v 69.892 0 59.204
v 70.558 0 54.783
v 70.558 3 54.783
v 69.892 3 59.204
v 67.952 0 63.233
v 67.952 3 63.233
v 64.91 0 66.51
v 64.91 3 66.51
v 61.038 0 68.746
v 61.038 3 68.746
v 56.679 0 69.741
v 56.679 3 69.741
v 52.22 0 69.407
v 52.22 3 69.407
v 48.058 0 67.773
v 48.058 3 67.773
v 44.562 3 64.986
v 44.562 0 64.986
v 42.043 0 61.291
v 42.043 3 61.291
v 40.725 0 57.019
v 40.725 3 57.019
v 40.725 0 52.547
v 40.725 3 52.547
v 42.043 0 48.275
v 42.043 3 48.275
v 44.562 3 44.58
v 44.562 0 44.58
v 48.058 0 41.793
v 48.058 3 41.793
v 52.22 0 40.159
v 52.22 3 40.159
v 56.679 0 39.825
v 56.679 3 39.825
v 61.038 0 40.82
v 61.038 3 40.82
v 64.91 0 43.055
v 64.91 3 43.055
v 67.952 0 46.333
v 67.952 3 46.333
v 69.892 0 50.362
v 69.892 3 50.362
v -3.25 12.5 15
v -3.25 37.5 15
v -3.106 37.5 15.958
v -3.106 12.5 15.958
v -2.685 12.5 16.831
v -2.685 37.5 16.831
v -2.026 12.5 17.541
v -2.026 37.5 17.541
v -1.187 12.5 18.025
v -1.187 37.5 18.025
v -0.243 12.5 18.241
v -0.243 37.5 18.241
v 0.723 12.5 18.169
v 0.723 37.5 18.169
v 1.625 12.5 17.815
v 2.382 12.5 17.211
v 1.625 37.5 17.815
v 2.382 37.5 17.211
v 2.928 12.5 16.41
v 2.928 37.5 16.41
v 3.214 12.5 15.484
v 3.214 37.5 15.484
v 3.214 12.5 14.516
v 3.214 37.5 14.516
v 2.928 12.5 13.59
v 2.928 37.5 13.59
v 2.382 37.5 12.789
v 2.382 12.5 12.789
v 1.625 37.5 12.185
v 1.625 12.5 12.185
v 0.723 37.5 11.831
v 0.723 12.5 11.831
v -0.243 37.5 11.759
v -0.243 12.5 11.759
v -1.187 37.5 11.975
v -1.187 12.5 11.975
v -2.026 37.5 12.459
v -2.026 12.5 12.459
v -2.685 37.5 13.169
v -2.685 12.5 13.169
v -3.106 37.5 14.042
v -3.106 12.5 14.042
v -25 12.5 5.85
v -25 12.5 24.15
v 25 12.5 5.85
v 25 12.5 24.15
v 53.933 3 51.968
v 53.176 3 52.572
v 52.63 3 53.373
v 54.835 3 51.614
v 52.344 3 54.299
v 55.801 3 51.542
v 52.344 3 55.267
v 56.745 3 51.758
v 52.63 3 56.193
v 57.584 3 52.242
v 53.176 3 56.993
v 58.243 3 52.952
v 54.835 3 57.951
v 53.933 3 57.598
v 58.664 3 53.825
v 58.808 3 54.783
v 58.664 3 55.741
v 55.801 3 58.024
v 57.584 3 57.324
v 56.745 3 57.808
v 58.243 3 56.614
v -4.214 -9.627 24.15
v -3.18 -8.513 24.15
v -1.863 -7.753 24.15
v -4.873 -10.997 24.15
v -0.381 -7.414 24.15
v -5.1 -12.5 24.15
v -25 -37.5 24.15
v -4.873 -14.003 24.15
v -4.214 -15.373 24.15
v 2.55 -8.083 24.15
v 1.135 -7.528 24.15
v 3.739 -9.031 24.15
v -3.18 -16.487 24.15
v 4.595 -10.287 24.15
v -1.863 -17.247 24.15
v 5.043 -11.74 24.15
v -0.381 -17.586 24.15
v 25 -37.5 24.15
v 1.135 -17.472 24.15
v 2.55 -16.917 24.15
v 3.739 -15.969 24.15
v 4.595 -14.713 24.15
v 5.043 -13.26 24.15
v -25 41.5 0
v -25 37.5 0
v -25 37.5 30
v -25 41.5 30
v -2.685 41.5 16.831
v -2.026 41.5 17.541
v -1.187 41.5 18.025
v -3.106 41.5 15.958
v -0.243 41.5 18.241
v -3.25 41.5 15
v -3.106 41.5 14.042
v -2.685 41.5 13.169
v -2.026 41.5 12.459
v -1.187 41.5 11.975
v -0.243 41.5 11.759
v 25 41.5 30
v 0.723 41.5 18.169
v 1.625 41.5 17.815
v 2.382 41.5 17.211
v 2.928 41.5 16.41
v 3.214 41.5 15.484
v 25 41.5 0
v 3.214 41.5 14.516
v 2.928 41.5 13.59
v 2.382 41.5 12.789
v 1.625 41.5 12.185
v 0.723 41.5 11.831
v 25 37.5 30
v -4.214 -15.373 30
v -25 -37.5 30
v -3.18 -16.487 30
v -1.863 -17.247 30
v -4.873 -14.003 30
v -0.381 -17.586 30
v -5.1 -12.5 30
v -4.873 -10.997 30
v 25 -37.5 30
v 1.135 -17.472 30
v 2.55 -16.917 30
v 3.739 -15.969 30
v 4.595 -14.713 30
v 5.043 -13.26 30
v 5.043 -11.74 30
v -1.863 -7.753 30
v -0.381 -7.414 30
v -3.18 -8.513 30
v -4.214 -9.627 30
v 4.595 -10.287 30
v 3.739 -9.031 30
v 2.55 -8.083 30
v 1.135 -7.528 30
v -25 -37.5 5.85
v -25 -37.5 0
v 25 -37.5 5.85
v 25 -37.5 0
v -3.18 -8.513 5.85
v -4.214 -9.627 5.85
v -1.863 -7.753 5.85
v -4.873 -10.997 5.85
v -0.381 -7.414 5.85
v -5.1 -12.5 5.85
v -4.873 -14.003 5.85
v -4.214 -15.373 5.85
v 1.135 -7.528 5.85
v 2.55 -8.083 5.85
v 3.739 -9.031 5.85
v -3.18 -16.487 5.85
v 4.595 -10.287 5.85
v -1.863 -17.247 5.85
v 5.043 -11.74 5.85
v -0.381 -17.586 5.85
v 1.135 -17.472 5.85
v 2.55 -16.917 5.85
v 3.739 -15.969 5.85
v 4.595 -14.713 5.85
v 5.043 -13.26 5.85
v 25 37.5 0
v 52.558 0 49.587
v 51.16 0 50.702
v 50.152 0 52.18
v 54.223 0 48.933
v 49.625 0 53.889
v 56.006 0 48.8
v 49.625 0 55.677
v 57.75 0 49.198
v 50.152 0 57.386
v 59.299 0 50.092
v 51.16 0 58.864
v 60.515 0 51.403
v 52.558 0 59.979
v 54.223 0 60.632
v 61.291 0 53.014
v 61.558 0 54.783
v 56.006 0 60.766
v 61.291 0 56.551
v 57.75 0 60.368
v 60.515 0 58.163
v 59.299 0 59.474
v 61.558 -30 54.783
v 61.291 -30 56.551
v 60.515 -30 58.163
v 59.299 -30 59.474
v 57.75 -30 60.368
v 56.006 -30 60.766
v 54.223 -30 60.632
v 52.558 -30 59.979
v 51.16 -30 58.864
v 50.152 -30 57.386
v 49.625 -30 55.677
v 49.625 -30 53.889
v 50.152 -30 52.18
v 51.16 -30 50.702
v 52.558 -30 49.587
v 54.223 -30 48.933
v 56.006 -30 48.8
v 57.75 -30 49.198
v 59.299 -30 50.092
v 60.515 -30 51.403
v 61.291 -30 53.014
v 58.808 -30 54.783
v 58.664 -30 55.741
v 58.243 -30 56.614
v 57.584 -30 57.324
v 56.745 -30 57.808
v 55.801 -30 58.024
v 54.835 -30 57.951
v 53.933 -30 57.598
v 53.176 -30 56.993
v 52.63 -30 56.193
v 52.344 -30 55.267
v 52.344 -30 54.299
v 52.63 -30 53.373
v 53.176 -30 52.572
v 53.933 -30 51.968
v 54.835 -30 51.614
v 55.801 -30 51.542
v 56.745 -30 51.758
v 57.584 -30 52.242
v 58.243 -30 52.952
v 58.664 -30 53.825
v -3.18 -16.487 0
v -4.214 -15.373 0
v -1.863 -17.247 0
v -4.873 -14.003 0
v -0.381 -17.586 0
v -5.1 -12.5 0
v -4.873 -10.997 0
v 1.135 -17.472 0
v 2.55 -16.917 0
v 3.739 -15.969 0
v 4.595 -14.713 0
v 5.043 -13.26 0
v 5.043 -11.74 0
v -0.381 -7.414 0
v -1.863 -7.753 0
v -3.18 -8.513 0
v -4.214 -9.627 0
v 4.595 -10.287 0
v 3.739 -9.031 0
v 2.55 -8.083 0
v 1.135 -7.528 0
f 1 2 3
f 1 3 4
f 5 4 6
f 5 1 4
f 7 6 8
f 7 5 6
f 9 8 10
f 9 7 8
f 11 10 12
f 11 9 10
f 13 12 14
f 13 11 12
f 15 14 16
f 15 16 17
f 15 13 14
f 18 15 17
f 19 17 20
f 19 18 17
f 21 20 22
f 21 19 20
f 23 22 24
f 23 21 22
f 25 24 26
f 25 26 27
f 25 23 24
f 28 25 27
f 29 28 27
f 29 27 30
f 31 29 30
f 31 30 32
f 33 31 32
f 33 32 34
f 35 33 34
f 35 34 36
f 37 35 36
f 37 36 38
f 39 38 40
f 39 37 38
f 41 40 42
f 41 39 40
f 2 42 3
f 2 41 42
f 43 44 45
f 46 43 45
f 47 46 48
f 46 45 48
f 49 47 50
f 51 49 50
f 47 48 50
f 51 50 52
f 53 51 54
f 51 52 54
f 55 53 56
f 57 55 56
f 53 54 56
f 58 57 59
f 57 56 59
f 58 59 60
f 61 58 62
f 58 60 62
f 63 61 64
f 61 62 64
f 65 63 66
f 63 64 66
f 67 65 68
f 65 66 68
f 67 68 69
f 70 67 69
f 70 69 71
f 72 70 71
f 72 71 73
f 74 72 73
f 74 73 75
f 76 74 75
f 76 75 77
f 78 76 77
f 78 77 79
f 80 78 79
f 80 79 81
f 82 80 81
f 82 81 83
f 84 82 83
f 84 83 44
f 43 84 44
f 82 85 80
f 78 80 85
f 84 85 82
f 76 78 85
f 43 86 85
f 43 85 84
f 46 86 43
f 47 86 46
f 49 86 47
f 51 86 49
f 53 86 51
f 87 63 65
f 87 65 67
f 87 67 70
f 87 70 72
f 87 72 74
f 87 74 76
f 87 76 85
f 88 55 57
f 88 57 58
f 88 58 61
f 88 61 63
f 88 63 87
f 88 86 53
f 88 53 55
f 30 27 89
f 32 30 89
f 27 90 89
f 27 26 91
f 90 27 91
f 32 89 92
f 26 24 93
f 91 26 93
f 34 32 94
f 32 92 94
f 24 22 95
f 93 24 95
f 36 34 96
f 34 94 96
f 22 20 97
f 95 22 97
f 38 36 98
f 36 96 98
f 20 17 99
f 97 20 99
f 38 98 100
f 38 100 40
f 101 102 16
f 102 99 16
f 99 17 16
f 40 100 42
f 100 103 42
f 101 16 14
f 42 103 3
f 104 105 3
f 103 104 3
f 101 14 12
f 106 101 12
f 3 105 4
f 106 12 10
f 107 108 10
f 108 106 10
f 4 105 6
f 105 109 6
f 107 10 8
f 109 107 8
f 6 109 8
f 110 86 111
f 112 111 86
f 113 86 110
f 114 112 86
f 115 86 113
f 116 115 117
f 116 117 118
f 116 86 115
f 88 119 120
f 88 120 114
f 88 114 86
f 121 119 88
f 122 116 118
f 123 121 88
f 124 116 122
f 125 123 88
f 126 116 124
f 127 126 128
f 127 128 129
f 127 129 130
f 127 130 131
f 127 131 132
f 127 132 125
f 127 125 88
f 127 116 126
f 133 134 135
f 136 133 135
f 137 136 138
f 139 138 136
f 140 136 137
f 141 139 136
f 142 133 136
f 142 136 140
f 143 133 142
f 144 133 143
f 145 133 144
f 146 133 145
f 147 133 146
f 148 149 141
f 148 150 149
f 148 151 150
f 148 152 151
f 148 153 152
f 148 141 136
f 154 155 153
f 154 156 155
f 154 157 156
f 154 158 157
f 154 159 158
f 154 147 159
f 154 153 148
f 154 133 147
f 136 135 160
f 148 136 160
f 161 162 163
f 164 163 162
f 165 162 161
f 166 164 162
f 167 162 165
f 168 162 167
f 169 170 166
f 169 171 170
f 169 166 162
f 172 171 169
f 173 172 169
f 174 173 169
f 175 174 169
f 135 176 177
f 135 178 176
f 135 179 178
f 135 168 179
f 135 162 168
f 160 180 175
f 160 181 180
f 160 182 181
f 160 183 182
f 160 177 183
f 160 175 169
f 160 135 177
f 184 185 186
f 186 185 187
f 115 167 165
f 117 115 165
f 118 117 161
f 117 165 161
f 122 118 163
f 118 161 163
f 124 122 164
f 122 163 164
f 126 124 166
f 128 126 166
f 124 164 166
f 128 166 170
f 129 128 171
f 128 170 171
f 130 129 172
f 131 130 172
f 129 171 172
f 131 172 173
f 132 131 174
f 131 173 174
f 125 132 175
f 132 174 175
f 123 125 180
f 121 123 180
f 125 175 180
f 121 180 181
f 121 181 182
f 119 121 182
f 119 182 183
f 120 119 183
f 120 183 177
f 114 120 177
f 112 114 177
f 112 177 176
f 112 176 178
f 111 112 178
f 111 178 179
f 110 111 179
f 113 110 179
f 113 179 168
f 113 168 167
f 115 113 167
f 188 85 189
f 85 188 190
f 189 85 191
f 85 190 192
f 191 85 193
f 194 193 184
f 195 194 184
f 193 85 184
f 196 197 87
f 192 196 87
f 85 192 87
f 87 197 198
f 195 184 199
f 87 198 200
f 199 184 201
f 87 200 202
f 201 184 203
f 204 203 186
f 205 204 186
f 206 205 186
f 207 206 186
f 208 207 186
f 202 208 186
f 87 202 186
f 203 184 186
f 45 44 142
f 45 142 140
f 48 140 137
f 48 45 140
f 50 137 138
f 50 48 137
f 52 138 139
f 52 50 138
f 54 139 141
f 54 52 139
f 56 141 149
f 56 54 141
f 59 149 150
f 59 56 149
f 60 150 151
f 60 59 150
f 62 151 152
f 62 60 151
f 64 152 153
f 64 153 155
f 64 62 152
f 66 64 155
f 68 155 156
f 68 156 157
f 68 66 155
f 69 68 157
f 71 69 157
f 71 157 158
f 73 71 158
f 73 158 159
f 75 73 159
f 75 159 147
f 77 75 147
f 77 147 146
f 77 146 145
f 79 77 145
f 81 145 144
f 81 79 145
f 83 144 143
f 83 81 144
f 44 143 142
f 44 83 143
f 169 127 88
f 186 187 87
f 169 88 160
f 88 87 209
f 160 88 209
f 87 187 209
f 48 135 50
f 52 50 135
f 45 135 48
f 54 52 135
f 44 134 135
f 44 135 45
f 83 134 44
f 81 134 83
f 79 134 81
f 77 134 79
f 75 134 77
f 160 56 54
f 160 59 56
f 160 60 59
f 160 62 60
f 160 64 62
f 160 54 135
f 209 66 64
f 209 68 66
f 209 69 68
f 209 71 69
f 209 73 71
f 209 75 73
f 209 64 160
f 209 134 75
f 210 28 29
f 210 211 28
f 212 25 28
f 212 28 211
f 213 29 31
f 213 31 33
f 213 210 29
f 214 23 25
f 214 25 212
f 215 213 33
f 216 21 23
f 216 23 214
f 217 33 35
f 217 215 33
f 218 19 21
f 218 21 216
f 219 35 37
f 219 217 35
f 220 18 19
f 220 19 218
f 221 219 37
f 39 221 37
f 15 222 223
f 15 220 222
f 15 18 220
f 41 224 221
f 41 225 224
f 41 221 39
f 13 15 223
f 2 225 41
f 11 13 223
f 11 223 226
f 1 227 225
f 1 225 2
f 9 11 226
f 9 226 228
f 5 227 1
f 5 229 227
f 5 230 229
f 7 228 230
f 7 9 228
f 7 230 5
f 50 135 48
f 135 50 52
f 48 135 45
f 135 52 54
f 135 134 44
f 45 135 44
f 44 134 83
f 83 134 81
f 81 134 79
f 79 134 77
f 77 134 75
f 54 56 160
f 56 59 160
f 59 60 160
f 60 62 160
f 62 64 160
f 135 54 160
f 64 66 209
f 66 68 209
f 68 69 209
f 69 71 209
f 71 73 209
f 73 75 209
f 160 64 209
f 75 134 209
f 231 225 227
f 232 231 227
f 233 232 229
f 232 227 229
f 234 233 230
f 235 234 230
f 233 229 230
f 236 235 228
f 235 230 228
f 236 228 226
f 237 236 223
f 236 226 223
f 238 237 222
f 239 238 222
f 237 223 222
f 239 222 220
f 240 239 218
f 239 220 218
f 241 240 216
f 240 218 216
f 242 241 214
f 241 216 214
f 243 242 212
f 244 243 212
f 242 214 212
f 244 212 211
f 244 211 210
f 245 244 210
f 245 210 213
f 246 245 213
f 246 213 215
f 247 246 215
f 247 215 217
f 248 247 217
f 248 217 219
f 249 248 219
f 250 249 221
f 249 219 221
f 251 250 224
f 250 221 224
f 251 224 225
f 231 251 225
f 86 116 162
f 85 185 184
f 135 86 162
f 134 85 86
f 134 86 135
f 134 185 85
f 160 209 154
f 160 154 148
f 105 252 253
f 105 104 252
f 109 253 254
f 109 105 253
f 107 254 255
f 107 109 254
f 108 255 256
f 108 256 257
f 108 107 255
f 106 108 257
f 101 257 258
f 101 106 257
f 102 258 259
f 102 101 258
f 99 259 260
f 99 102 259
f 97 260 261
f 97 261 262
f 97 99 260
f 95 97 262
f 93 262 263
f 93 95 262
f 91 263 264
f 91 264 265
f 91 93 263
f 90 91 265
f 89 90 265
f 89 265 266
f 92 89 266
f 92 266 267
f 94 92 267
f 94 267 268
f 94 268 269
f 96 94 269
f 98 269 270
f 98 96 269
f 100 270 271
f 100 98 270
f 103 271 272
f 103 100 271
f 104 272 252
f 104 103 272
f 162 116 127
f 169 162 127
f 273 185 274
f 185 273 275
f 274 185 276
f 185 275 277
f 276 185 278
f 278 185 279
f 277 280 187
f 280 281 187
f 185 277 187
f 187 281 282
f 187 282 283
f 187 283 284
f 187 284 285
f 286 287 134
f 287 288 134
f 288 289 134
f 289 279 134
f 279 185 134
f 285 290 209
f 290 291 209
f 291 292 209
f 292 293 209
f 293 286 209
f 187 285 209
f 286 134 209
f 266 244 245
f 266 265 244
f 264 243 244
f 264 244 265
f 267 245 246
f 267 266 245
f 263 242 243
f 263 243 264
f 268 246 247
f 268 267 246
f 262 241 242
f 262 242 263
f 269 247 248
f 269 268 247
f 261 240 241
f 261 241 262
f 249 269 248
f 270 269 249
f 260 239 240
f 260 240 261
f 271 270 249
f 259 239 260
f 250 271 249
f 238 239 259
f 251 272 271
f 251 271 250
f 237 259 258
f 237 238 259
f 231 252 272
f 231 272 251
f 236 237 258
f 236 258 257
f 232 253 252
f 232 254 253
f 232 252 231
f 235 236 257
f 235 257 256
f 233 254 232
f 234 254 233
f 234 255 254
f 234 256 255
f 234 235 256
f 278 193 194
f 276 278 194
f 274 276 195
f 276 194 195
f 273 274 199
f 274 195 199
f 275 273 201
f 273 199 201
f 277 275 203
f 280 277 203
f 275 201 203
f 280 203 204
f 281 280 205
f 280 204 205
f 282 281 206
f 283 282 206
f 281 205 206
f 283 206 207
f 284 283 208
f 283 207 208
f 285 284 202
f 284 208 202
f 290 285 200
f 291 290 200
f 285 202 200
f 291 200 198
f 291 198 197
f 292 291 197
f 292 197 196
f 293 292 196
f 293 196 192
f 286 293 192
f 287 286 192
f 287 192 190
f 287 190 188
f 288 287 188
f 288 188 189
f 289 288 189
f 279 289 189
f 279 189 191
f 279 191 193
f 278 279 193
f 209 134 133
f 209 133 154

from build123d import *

# Parameters (mm, degrees)
F0_W      = 50
F0_H      = 75
F1_DEPTH  = 30
F2_W      = 50
F2_H      = 18.3
F3_DEPTH  = 50
F4_D      = 6.5
F6_D      = 10.2
F7_R      = 15
F7_R_2    = 6
F7_R_3    = 3.25
F8_DEPTH  = 3
F9_DEPTH  = 30
F10_DEPTH = 4


with BuildPart() as f1:
    # F0 (on Top) → F1 (new body)
    with BuildSketch(Plane.XY):
        Rectangle(F0_W, F0_H)
    extrude(amount=F1_DEPTH)

    # F2 (on face) → F3 (cut)
    with BuildSketch(Plane.XZ.offset(37.5)):
        with Locations((0, 15)):
            Rectangle(F2_W, F2_H)
    extrude(amount=-F3_DEPTH, mode=Mode.SUBTRACT)

    # F4 (through all)
    with Locations(Plane.XZ.offset(37.5)):
        with Locations((0, 15)):
            Hole(F4_D / 2)

    # F6 (through all)
    with Locations(Plane(origin=(0, 0, 0), x_dir=(1, 0, 0), z_dir=(0, 0, -1))):
        with Locations((0, 12.5)):
            Hole(F6_D / 2)


with BuildPart() as f8:
    # F7 (on Front) → F8 (new body)
    with BuildSketch(Plane.XZ):
        with Locations((55.5579289794, 54.782923311)):
            Circle(F7_R)
        with Locations((55.5579289794, 54.782923311)):
            Circle(F7_R_2, mode=Mode.SUBTRACT)
        with Locations((55.5579289794, 54.782923311)):
            Circle(F7_R_2)
        with Locations((55.5579289794, 54.782923311)):
            Circle(F7_R_3, mode=Mode.SUBTRACT)
    extrude(amount=-F8_DEPTH)

    # F7 (on Front) → F9 (join)
    with BuildSketch(Plane.XZ):
        with Locations((55.5579289794, 54.782923311)):
            Circle(F7_R_2)
        with Locations((55.5579289794, 54.782923311)):
            Circle(F7_R_3, mode=Mode.SUBTRACT)
    extrude(amount=F9_DEPTH)


with BuildPart() as f10:
    # F10 (new): a face of the model
    f10_faces = [f1.part.faces().sort_by_distance(p)[0] for p in [
        (24.4169048105, 37.5, 15),
    ]]
    extrude(f10_faces, amount=F10_DEPTH)


solid = Compound([f1.part, f8.part, f10.part])
